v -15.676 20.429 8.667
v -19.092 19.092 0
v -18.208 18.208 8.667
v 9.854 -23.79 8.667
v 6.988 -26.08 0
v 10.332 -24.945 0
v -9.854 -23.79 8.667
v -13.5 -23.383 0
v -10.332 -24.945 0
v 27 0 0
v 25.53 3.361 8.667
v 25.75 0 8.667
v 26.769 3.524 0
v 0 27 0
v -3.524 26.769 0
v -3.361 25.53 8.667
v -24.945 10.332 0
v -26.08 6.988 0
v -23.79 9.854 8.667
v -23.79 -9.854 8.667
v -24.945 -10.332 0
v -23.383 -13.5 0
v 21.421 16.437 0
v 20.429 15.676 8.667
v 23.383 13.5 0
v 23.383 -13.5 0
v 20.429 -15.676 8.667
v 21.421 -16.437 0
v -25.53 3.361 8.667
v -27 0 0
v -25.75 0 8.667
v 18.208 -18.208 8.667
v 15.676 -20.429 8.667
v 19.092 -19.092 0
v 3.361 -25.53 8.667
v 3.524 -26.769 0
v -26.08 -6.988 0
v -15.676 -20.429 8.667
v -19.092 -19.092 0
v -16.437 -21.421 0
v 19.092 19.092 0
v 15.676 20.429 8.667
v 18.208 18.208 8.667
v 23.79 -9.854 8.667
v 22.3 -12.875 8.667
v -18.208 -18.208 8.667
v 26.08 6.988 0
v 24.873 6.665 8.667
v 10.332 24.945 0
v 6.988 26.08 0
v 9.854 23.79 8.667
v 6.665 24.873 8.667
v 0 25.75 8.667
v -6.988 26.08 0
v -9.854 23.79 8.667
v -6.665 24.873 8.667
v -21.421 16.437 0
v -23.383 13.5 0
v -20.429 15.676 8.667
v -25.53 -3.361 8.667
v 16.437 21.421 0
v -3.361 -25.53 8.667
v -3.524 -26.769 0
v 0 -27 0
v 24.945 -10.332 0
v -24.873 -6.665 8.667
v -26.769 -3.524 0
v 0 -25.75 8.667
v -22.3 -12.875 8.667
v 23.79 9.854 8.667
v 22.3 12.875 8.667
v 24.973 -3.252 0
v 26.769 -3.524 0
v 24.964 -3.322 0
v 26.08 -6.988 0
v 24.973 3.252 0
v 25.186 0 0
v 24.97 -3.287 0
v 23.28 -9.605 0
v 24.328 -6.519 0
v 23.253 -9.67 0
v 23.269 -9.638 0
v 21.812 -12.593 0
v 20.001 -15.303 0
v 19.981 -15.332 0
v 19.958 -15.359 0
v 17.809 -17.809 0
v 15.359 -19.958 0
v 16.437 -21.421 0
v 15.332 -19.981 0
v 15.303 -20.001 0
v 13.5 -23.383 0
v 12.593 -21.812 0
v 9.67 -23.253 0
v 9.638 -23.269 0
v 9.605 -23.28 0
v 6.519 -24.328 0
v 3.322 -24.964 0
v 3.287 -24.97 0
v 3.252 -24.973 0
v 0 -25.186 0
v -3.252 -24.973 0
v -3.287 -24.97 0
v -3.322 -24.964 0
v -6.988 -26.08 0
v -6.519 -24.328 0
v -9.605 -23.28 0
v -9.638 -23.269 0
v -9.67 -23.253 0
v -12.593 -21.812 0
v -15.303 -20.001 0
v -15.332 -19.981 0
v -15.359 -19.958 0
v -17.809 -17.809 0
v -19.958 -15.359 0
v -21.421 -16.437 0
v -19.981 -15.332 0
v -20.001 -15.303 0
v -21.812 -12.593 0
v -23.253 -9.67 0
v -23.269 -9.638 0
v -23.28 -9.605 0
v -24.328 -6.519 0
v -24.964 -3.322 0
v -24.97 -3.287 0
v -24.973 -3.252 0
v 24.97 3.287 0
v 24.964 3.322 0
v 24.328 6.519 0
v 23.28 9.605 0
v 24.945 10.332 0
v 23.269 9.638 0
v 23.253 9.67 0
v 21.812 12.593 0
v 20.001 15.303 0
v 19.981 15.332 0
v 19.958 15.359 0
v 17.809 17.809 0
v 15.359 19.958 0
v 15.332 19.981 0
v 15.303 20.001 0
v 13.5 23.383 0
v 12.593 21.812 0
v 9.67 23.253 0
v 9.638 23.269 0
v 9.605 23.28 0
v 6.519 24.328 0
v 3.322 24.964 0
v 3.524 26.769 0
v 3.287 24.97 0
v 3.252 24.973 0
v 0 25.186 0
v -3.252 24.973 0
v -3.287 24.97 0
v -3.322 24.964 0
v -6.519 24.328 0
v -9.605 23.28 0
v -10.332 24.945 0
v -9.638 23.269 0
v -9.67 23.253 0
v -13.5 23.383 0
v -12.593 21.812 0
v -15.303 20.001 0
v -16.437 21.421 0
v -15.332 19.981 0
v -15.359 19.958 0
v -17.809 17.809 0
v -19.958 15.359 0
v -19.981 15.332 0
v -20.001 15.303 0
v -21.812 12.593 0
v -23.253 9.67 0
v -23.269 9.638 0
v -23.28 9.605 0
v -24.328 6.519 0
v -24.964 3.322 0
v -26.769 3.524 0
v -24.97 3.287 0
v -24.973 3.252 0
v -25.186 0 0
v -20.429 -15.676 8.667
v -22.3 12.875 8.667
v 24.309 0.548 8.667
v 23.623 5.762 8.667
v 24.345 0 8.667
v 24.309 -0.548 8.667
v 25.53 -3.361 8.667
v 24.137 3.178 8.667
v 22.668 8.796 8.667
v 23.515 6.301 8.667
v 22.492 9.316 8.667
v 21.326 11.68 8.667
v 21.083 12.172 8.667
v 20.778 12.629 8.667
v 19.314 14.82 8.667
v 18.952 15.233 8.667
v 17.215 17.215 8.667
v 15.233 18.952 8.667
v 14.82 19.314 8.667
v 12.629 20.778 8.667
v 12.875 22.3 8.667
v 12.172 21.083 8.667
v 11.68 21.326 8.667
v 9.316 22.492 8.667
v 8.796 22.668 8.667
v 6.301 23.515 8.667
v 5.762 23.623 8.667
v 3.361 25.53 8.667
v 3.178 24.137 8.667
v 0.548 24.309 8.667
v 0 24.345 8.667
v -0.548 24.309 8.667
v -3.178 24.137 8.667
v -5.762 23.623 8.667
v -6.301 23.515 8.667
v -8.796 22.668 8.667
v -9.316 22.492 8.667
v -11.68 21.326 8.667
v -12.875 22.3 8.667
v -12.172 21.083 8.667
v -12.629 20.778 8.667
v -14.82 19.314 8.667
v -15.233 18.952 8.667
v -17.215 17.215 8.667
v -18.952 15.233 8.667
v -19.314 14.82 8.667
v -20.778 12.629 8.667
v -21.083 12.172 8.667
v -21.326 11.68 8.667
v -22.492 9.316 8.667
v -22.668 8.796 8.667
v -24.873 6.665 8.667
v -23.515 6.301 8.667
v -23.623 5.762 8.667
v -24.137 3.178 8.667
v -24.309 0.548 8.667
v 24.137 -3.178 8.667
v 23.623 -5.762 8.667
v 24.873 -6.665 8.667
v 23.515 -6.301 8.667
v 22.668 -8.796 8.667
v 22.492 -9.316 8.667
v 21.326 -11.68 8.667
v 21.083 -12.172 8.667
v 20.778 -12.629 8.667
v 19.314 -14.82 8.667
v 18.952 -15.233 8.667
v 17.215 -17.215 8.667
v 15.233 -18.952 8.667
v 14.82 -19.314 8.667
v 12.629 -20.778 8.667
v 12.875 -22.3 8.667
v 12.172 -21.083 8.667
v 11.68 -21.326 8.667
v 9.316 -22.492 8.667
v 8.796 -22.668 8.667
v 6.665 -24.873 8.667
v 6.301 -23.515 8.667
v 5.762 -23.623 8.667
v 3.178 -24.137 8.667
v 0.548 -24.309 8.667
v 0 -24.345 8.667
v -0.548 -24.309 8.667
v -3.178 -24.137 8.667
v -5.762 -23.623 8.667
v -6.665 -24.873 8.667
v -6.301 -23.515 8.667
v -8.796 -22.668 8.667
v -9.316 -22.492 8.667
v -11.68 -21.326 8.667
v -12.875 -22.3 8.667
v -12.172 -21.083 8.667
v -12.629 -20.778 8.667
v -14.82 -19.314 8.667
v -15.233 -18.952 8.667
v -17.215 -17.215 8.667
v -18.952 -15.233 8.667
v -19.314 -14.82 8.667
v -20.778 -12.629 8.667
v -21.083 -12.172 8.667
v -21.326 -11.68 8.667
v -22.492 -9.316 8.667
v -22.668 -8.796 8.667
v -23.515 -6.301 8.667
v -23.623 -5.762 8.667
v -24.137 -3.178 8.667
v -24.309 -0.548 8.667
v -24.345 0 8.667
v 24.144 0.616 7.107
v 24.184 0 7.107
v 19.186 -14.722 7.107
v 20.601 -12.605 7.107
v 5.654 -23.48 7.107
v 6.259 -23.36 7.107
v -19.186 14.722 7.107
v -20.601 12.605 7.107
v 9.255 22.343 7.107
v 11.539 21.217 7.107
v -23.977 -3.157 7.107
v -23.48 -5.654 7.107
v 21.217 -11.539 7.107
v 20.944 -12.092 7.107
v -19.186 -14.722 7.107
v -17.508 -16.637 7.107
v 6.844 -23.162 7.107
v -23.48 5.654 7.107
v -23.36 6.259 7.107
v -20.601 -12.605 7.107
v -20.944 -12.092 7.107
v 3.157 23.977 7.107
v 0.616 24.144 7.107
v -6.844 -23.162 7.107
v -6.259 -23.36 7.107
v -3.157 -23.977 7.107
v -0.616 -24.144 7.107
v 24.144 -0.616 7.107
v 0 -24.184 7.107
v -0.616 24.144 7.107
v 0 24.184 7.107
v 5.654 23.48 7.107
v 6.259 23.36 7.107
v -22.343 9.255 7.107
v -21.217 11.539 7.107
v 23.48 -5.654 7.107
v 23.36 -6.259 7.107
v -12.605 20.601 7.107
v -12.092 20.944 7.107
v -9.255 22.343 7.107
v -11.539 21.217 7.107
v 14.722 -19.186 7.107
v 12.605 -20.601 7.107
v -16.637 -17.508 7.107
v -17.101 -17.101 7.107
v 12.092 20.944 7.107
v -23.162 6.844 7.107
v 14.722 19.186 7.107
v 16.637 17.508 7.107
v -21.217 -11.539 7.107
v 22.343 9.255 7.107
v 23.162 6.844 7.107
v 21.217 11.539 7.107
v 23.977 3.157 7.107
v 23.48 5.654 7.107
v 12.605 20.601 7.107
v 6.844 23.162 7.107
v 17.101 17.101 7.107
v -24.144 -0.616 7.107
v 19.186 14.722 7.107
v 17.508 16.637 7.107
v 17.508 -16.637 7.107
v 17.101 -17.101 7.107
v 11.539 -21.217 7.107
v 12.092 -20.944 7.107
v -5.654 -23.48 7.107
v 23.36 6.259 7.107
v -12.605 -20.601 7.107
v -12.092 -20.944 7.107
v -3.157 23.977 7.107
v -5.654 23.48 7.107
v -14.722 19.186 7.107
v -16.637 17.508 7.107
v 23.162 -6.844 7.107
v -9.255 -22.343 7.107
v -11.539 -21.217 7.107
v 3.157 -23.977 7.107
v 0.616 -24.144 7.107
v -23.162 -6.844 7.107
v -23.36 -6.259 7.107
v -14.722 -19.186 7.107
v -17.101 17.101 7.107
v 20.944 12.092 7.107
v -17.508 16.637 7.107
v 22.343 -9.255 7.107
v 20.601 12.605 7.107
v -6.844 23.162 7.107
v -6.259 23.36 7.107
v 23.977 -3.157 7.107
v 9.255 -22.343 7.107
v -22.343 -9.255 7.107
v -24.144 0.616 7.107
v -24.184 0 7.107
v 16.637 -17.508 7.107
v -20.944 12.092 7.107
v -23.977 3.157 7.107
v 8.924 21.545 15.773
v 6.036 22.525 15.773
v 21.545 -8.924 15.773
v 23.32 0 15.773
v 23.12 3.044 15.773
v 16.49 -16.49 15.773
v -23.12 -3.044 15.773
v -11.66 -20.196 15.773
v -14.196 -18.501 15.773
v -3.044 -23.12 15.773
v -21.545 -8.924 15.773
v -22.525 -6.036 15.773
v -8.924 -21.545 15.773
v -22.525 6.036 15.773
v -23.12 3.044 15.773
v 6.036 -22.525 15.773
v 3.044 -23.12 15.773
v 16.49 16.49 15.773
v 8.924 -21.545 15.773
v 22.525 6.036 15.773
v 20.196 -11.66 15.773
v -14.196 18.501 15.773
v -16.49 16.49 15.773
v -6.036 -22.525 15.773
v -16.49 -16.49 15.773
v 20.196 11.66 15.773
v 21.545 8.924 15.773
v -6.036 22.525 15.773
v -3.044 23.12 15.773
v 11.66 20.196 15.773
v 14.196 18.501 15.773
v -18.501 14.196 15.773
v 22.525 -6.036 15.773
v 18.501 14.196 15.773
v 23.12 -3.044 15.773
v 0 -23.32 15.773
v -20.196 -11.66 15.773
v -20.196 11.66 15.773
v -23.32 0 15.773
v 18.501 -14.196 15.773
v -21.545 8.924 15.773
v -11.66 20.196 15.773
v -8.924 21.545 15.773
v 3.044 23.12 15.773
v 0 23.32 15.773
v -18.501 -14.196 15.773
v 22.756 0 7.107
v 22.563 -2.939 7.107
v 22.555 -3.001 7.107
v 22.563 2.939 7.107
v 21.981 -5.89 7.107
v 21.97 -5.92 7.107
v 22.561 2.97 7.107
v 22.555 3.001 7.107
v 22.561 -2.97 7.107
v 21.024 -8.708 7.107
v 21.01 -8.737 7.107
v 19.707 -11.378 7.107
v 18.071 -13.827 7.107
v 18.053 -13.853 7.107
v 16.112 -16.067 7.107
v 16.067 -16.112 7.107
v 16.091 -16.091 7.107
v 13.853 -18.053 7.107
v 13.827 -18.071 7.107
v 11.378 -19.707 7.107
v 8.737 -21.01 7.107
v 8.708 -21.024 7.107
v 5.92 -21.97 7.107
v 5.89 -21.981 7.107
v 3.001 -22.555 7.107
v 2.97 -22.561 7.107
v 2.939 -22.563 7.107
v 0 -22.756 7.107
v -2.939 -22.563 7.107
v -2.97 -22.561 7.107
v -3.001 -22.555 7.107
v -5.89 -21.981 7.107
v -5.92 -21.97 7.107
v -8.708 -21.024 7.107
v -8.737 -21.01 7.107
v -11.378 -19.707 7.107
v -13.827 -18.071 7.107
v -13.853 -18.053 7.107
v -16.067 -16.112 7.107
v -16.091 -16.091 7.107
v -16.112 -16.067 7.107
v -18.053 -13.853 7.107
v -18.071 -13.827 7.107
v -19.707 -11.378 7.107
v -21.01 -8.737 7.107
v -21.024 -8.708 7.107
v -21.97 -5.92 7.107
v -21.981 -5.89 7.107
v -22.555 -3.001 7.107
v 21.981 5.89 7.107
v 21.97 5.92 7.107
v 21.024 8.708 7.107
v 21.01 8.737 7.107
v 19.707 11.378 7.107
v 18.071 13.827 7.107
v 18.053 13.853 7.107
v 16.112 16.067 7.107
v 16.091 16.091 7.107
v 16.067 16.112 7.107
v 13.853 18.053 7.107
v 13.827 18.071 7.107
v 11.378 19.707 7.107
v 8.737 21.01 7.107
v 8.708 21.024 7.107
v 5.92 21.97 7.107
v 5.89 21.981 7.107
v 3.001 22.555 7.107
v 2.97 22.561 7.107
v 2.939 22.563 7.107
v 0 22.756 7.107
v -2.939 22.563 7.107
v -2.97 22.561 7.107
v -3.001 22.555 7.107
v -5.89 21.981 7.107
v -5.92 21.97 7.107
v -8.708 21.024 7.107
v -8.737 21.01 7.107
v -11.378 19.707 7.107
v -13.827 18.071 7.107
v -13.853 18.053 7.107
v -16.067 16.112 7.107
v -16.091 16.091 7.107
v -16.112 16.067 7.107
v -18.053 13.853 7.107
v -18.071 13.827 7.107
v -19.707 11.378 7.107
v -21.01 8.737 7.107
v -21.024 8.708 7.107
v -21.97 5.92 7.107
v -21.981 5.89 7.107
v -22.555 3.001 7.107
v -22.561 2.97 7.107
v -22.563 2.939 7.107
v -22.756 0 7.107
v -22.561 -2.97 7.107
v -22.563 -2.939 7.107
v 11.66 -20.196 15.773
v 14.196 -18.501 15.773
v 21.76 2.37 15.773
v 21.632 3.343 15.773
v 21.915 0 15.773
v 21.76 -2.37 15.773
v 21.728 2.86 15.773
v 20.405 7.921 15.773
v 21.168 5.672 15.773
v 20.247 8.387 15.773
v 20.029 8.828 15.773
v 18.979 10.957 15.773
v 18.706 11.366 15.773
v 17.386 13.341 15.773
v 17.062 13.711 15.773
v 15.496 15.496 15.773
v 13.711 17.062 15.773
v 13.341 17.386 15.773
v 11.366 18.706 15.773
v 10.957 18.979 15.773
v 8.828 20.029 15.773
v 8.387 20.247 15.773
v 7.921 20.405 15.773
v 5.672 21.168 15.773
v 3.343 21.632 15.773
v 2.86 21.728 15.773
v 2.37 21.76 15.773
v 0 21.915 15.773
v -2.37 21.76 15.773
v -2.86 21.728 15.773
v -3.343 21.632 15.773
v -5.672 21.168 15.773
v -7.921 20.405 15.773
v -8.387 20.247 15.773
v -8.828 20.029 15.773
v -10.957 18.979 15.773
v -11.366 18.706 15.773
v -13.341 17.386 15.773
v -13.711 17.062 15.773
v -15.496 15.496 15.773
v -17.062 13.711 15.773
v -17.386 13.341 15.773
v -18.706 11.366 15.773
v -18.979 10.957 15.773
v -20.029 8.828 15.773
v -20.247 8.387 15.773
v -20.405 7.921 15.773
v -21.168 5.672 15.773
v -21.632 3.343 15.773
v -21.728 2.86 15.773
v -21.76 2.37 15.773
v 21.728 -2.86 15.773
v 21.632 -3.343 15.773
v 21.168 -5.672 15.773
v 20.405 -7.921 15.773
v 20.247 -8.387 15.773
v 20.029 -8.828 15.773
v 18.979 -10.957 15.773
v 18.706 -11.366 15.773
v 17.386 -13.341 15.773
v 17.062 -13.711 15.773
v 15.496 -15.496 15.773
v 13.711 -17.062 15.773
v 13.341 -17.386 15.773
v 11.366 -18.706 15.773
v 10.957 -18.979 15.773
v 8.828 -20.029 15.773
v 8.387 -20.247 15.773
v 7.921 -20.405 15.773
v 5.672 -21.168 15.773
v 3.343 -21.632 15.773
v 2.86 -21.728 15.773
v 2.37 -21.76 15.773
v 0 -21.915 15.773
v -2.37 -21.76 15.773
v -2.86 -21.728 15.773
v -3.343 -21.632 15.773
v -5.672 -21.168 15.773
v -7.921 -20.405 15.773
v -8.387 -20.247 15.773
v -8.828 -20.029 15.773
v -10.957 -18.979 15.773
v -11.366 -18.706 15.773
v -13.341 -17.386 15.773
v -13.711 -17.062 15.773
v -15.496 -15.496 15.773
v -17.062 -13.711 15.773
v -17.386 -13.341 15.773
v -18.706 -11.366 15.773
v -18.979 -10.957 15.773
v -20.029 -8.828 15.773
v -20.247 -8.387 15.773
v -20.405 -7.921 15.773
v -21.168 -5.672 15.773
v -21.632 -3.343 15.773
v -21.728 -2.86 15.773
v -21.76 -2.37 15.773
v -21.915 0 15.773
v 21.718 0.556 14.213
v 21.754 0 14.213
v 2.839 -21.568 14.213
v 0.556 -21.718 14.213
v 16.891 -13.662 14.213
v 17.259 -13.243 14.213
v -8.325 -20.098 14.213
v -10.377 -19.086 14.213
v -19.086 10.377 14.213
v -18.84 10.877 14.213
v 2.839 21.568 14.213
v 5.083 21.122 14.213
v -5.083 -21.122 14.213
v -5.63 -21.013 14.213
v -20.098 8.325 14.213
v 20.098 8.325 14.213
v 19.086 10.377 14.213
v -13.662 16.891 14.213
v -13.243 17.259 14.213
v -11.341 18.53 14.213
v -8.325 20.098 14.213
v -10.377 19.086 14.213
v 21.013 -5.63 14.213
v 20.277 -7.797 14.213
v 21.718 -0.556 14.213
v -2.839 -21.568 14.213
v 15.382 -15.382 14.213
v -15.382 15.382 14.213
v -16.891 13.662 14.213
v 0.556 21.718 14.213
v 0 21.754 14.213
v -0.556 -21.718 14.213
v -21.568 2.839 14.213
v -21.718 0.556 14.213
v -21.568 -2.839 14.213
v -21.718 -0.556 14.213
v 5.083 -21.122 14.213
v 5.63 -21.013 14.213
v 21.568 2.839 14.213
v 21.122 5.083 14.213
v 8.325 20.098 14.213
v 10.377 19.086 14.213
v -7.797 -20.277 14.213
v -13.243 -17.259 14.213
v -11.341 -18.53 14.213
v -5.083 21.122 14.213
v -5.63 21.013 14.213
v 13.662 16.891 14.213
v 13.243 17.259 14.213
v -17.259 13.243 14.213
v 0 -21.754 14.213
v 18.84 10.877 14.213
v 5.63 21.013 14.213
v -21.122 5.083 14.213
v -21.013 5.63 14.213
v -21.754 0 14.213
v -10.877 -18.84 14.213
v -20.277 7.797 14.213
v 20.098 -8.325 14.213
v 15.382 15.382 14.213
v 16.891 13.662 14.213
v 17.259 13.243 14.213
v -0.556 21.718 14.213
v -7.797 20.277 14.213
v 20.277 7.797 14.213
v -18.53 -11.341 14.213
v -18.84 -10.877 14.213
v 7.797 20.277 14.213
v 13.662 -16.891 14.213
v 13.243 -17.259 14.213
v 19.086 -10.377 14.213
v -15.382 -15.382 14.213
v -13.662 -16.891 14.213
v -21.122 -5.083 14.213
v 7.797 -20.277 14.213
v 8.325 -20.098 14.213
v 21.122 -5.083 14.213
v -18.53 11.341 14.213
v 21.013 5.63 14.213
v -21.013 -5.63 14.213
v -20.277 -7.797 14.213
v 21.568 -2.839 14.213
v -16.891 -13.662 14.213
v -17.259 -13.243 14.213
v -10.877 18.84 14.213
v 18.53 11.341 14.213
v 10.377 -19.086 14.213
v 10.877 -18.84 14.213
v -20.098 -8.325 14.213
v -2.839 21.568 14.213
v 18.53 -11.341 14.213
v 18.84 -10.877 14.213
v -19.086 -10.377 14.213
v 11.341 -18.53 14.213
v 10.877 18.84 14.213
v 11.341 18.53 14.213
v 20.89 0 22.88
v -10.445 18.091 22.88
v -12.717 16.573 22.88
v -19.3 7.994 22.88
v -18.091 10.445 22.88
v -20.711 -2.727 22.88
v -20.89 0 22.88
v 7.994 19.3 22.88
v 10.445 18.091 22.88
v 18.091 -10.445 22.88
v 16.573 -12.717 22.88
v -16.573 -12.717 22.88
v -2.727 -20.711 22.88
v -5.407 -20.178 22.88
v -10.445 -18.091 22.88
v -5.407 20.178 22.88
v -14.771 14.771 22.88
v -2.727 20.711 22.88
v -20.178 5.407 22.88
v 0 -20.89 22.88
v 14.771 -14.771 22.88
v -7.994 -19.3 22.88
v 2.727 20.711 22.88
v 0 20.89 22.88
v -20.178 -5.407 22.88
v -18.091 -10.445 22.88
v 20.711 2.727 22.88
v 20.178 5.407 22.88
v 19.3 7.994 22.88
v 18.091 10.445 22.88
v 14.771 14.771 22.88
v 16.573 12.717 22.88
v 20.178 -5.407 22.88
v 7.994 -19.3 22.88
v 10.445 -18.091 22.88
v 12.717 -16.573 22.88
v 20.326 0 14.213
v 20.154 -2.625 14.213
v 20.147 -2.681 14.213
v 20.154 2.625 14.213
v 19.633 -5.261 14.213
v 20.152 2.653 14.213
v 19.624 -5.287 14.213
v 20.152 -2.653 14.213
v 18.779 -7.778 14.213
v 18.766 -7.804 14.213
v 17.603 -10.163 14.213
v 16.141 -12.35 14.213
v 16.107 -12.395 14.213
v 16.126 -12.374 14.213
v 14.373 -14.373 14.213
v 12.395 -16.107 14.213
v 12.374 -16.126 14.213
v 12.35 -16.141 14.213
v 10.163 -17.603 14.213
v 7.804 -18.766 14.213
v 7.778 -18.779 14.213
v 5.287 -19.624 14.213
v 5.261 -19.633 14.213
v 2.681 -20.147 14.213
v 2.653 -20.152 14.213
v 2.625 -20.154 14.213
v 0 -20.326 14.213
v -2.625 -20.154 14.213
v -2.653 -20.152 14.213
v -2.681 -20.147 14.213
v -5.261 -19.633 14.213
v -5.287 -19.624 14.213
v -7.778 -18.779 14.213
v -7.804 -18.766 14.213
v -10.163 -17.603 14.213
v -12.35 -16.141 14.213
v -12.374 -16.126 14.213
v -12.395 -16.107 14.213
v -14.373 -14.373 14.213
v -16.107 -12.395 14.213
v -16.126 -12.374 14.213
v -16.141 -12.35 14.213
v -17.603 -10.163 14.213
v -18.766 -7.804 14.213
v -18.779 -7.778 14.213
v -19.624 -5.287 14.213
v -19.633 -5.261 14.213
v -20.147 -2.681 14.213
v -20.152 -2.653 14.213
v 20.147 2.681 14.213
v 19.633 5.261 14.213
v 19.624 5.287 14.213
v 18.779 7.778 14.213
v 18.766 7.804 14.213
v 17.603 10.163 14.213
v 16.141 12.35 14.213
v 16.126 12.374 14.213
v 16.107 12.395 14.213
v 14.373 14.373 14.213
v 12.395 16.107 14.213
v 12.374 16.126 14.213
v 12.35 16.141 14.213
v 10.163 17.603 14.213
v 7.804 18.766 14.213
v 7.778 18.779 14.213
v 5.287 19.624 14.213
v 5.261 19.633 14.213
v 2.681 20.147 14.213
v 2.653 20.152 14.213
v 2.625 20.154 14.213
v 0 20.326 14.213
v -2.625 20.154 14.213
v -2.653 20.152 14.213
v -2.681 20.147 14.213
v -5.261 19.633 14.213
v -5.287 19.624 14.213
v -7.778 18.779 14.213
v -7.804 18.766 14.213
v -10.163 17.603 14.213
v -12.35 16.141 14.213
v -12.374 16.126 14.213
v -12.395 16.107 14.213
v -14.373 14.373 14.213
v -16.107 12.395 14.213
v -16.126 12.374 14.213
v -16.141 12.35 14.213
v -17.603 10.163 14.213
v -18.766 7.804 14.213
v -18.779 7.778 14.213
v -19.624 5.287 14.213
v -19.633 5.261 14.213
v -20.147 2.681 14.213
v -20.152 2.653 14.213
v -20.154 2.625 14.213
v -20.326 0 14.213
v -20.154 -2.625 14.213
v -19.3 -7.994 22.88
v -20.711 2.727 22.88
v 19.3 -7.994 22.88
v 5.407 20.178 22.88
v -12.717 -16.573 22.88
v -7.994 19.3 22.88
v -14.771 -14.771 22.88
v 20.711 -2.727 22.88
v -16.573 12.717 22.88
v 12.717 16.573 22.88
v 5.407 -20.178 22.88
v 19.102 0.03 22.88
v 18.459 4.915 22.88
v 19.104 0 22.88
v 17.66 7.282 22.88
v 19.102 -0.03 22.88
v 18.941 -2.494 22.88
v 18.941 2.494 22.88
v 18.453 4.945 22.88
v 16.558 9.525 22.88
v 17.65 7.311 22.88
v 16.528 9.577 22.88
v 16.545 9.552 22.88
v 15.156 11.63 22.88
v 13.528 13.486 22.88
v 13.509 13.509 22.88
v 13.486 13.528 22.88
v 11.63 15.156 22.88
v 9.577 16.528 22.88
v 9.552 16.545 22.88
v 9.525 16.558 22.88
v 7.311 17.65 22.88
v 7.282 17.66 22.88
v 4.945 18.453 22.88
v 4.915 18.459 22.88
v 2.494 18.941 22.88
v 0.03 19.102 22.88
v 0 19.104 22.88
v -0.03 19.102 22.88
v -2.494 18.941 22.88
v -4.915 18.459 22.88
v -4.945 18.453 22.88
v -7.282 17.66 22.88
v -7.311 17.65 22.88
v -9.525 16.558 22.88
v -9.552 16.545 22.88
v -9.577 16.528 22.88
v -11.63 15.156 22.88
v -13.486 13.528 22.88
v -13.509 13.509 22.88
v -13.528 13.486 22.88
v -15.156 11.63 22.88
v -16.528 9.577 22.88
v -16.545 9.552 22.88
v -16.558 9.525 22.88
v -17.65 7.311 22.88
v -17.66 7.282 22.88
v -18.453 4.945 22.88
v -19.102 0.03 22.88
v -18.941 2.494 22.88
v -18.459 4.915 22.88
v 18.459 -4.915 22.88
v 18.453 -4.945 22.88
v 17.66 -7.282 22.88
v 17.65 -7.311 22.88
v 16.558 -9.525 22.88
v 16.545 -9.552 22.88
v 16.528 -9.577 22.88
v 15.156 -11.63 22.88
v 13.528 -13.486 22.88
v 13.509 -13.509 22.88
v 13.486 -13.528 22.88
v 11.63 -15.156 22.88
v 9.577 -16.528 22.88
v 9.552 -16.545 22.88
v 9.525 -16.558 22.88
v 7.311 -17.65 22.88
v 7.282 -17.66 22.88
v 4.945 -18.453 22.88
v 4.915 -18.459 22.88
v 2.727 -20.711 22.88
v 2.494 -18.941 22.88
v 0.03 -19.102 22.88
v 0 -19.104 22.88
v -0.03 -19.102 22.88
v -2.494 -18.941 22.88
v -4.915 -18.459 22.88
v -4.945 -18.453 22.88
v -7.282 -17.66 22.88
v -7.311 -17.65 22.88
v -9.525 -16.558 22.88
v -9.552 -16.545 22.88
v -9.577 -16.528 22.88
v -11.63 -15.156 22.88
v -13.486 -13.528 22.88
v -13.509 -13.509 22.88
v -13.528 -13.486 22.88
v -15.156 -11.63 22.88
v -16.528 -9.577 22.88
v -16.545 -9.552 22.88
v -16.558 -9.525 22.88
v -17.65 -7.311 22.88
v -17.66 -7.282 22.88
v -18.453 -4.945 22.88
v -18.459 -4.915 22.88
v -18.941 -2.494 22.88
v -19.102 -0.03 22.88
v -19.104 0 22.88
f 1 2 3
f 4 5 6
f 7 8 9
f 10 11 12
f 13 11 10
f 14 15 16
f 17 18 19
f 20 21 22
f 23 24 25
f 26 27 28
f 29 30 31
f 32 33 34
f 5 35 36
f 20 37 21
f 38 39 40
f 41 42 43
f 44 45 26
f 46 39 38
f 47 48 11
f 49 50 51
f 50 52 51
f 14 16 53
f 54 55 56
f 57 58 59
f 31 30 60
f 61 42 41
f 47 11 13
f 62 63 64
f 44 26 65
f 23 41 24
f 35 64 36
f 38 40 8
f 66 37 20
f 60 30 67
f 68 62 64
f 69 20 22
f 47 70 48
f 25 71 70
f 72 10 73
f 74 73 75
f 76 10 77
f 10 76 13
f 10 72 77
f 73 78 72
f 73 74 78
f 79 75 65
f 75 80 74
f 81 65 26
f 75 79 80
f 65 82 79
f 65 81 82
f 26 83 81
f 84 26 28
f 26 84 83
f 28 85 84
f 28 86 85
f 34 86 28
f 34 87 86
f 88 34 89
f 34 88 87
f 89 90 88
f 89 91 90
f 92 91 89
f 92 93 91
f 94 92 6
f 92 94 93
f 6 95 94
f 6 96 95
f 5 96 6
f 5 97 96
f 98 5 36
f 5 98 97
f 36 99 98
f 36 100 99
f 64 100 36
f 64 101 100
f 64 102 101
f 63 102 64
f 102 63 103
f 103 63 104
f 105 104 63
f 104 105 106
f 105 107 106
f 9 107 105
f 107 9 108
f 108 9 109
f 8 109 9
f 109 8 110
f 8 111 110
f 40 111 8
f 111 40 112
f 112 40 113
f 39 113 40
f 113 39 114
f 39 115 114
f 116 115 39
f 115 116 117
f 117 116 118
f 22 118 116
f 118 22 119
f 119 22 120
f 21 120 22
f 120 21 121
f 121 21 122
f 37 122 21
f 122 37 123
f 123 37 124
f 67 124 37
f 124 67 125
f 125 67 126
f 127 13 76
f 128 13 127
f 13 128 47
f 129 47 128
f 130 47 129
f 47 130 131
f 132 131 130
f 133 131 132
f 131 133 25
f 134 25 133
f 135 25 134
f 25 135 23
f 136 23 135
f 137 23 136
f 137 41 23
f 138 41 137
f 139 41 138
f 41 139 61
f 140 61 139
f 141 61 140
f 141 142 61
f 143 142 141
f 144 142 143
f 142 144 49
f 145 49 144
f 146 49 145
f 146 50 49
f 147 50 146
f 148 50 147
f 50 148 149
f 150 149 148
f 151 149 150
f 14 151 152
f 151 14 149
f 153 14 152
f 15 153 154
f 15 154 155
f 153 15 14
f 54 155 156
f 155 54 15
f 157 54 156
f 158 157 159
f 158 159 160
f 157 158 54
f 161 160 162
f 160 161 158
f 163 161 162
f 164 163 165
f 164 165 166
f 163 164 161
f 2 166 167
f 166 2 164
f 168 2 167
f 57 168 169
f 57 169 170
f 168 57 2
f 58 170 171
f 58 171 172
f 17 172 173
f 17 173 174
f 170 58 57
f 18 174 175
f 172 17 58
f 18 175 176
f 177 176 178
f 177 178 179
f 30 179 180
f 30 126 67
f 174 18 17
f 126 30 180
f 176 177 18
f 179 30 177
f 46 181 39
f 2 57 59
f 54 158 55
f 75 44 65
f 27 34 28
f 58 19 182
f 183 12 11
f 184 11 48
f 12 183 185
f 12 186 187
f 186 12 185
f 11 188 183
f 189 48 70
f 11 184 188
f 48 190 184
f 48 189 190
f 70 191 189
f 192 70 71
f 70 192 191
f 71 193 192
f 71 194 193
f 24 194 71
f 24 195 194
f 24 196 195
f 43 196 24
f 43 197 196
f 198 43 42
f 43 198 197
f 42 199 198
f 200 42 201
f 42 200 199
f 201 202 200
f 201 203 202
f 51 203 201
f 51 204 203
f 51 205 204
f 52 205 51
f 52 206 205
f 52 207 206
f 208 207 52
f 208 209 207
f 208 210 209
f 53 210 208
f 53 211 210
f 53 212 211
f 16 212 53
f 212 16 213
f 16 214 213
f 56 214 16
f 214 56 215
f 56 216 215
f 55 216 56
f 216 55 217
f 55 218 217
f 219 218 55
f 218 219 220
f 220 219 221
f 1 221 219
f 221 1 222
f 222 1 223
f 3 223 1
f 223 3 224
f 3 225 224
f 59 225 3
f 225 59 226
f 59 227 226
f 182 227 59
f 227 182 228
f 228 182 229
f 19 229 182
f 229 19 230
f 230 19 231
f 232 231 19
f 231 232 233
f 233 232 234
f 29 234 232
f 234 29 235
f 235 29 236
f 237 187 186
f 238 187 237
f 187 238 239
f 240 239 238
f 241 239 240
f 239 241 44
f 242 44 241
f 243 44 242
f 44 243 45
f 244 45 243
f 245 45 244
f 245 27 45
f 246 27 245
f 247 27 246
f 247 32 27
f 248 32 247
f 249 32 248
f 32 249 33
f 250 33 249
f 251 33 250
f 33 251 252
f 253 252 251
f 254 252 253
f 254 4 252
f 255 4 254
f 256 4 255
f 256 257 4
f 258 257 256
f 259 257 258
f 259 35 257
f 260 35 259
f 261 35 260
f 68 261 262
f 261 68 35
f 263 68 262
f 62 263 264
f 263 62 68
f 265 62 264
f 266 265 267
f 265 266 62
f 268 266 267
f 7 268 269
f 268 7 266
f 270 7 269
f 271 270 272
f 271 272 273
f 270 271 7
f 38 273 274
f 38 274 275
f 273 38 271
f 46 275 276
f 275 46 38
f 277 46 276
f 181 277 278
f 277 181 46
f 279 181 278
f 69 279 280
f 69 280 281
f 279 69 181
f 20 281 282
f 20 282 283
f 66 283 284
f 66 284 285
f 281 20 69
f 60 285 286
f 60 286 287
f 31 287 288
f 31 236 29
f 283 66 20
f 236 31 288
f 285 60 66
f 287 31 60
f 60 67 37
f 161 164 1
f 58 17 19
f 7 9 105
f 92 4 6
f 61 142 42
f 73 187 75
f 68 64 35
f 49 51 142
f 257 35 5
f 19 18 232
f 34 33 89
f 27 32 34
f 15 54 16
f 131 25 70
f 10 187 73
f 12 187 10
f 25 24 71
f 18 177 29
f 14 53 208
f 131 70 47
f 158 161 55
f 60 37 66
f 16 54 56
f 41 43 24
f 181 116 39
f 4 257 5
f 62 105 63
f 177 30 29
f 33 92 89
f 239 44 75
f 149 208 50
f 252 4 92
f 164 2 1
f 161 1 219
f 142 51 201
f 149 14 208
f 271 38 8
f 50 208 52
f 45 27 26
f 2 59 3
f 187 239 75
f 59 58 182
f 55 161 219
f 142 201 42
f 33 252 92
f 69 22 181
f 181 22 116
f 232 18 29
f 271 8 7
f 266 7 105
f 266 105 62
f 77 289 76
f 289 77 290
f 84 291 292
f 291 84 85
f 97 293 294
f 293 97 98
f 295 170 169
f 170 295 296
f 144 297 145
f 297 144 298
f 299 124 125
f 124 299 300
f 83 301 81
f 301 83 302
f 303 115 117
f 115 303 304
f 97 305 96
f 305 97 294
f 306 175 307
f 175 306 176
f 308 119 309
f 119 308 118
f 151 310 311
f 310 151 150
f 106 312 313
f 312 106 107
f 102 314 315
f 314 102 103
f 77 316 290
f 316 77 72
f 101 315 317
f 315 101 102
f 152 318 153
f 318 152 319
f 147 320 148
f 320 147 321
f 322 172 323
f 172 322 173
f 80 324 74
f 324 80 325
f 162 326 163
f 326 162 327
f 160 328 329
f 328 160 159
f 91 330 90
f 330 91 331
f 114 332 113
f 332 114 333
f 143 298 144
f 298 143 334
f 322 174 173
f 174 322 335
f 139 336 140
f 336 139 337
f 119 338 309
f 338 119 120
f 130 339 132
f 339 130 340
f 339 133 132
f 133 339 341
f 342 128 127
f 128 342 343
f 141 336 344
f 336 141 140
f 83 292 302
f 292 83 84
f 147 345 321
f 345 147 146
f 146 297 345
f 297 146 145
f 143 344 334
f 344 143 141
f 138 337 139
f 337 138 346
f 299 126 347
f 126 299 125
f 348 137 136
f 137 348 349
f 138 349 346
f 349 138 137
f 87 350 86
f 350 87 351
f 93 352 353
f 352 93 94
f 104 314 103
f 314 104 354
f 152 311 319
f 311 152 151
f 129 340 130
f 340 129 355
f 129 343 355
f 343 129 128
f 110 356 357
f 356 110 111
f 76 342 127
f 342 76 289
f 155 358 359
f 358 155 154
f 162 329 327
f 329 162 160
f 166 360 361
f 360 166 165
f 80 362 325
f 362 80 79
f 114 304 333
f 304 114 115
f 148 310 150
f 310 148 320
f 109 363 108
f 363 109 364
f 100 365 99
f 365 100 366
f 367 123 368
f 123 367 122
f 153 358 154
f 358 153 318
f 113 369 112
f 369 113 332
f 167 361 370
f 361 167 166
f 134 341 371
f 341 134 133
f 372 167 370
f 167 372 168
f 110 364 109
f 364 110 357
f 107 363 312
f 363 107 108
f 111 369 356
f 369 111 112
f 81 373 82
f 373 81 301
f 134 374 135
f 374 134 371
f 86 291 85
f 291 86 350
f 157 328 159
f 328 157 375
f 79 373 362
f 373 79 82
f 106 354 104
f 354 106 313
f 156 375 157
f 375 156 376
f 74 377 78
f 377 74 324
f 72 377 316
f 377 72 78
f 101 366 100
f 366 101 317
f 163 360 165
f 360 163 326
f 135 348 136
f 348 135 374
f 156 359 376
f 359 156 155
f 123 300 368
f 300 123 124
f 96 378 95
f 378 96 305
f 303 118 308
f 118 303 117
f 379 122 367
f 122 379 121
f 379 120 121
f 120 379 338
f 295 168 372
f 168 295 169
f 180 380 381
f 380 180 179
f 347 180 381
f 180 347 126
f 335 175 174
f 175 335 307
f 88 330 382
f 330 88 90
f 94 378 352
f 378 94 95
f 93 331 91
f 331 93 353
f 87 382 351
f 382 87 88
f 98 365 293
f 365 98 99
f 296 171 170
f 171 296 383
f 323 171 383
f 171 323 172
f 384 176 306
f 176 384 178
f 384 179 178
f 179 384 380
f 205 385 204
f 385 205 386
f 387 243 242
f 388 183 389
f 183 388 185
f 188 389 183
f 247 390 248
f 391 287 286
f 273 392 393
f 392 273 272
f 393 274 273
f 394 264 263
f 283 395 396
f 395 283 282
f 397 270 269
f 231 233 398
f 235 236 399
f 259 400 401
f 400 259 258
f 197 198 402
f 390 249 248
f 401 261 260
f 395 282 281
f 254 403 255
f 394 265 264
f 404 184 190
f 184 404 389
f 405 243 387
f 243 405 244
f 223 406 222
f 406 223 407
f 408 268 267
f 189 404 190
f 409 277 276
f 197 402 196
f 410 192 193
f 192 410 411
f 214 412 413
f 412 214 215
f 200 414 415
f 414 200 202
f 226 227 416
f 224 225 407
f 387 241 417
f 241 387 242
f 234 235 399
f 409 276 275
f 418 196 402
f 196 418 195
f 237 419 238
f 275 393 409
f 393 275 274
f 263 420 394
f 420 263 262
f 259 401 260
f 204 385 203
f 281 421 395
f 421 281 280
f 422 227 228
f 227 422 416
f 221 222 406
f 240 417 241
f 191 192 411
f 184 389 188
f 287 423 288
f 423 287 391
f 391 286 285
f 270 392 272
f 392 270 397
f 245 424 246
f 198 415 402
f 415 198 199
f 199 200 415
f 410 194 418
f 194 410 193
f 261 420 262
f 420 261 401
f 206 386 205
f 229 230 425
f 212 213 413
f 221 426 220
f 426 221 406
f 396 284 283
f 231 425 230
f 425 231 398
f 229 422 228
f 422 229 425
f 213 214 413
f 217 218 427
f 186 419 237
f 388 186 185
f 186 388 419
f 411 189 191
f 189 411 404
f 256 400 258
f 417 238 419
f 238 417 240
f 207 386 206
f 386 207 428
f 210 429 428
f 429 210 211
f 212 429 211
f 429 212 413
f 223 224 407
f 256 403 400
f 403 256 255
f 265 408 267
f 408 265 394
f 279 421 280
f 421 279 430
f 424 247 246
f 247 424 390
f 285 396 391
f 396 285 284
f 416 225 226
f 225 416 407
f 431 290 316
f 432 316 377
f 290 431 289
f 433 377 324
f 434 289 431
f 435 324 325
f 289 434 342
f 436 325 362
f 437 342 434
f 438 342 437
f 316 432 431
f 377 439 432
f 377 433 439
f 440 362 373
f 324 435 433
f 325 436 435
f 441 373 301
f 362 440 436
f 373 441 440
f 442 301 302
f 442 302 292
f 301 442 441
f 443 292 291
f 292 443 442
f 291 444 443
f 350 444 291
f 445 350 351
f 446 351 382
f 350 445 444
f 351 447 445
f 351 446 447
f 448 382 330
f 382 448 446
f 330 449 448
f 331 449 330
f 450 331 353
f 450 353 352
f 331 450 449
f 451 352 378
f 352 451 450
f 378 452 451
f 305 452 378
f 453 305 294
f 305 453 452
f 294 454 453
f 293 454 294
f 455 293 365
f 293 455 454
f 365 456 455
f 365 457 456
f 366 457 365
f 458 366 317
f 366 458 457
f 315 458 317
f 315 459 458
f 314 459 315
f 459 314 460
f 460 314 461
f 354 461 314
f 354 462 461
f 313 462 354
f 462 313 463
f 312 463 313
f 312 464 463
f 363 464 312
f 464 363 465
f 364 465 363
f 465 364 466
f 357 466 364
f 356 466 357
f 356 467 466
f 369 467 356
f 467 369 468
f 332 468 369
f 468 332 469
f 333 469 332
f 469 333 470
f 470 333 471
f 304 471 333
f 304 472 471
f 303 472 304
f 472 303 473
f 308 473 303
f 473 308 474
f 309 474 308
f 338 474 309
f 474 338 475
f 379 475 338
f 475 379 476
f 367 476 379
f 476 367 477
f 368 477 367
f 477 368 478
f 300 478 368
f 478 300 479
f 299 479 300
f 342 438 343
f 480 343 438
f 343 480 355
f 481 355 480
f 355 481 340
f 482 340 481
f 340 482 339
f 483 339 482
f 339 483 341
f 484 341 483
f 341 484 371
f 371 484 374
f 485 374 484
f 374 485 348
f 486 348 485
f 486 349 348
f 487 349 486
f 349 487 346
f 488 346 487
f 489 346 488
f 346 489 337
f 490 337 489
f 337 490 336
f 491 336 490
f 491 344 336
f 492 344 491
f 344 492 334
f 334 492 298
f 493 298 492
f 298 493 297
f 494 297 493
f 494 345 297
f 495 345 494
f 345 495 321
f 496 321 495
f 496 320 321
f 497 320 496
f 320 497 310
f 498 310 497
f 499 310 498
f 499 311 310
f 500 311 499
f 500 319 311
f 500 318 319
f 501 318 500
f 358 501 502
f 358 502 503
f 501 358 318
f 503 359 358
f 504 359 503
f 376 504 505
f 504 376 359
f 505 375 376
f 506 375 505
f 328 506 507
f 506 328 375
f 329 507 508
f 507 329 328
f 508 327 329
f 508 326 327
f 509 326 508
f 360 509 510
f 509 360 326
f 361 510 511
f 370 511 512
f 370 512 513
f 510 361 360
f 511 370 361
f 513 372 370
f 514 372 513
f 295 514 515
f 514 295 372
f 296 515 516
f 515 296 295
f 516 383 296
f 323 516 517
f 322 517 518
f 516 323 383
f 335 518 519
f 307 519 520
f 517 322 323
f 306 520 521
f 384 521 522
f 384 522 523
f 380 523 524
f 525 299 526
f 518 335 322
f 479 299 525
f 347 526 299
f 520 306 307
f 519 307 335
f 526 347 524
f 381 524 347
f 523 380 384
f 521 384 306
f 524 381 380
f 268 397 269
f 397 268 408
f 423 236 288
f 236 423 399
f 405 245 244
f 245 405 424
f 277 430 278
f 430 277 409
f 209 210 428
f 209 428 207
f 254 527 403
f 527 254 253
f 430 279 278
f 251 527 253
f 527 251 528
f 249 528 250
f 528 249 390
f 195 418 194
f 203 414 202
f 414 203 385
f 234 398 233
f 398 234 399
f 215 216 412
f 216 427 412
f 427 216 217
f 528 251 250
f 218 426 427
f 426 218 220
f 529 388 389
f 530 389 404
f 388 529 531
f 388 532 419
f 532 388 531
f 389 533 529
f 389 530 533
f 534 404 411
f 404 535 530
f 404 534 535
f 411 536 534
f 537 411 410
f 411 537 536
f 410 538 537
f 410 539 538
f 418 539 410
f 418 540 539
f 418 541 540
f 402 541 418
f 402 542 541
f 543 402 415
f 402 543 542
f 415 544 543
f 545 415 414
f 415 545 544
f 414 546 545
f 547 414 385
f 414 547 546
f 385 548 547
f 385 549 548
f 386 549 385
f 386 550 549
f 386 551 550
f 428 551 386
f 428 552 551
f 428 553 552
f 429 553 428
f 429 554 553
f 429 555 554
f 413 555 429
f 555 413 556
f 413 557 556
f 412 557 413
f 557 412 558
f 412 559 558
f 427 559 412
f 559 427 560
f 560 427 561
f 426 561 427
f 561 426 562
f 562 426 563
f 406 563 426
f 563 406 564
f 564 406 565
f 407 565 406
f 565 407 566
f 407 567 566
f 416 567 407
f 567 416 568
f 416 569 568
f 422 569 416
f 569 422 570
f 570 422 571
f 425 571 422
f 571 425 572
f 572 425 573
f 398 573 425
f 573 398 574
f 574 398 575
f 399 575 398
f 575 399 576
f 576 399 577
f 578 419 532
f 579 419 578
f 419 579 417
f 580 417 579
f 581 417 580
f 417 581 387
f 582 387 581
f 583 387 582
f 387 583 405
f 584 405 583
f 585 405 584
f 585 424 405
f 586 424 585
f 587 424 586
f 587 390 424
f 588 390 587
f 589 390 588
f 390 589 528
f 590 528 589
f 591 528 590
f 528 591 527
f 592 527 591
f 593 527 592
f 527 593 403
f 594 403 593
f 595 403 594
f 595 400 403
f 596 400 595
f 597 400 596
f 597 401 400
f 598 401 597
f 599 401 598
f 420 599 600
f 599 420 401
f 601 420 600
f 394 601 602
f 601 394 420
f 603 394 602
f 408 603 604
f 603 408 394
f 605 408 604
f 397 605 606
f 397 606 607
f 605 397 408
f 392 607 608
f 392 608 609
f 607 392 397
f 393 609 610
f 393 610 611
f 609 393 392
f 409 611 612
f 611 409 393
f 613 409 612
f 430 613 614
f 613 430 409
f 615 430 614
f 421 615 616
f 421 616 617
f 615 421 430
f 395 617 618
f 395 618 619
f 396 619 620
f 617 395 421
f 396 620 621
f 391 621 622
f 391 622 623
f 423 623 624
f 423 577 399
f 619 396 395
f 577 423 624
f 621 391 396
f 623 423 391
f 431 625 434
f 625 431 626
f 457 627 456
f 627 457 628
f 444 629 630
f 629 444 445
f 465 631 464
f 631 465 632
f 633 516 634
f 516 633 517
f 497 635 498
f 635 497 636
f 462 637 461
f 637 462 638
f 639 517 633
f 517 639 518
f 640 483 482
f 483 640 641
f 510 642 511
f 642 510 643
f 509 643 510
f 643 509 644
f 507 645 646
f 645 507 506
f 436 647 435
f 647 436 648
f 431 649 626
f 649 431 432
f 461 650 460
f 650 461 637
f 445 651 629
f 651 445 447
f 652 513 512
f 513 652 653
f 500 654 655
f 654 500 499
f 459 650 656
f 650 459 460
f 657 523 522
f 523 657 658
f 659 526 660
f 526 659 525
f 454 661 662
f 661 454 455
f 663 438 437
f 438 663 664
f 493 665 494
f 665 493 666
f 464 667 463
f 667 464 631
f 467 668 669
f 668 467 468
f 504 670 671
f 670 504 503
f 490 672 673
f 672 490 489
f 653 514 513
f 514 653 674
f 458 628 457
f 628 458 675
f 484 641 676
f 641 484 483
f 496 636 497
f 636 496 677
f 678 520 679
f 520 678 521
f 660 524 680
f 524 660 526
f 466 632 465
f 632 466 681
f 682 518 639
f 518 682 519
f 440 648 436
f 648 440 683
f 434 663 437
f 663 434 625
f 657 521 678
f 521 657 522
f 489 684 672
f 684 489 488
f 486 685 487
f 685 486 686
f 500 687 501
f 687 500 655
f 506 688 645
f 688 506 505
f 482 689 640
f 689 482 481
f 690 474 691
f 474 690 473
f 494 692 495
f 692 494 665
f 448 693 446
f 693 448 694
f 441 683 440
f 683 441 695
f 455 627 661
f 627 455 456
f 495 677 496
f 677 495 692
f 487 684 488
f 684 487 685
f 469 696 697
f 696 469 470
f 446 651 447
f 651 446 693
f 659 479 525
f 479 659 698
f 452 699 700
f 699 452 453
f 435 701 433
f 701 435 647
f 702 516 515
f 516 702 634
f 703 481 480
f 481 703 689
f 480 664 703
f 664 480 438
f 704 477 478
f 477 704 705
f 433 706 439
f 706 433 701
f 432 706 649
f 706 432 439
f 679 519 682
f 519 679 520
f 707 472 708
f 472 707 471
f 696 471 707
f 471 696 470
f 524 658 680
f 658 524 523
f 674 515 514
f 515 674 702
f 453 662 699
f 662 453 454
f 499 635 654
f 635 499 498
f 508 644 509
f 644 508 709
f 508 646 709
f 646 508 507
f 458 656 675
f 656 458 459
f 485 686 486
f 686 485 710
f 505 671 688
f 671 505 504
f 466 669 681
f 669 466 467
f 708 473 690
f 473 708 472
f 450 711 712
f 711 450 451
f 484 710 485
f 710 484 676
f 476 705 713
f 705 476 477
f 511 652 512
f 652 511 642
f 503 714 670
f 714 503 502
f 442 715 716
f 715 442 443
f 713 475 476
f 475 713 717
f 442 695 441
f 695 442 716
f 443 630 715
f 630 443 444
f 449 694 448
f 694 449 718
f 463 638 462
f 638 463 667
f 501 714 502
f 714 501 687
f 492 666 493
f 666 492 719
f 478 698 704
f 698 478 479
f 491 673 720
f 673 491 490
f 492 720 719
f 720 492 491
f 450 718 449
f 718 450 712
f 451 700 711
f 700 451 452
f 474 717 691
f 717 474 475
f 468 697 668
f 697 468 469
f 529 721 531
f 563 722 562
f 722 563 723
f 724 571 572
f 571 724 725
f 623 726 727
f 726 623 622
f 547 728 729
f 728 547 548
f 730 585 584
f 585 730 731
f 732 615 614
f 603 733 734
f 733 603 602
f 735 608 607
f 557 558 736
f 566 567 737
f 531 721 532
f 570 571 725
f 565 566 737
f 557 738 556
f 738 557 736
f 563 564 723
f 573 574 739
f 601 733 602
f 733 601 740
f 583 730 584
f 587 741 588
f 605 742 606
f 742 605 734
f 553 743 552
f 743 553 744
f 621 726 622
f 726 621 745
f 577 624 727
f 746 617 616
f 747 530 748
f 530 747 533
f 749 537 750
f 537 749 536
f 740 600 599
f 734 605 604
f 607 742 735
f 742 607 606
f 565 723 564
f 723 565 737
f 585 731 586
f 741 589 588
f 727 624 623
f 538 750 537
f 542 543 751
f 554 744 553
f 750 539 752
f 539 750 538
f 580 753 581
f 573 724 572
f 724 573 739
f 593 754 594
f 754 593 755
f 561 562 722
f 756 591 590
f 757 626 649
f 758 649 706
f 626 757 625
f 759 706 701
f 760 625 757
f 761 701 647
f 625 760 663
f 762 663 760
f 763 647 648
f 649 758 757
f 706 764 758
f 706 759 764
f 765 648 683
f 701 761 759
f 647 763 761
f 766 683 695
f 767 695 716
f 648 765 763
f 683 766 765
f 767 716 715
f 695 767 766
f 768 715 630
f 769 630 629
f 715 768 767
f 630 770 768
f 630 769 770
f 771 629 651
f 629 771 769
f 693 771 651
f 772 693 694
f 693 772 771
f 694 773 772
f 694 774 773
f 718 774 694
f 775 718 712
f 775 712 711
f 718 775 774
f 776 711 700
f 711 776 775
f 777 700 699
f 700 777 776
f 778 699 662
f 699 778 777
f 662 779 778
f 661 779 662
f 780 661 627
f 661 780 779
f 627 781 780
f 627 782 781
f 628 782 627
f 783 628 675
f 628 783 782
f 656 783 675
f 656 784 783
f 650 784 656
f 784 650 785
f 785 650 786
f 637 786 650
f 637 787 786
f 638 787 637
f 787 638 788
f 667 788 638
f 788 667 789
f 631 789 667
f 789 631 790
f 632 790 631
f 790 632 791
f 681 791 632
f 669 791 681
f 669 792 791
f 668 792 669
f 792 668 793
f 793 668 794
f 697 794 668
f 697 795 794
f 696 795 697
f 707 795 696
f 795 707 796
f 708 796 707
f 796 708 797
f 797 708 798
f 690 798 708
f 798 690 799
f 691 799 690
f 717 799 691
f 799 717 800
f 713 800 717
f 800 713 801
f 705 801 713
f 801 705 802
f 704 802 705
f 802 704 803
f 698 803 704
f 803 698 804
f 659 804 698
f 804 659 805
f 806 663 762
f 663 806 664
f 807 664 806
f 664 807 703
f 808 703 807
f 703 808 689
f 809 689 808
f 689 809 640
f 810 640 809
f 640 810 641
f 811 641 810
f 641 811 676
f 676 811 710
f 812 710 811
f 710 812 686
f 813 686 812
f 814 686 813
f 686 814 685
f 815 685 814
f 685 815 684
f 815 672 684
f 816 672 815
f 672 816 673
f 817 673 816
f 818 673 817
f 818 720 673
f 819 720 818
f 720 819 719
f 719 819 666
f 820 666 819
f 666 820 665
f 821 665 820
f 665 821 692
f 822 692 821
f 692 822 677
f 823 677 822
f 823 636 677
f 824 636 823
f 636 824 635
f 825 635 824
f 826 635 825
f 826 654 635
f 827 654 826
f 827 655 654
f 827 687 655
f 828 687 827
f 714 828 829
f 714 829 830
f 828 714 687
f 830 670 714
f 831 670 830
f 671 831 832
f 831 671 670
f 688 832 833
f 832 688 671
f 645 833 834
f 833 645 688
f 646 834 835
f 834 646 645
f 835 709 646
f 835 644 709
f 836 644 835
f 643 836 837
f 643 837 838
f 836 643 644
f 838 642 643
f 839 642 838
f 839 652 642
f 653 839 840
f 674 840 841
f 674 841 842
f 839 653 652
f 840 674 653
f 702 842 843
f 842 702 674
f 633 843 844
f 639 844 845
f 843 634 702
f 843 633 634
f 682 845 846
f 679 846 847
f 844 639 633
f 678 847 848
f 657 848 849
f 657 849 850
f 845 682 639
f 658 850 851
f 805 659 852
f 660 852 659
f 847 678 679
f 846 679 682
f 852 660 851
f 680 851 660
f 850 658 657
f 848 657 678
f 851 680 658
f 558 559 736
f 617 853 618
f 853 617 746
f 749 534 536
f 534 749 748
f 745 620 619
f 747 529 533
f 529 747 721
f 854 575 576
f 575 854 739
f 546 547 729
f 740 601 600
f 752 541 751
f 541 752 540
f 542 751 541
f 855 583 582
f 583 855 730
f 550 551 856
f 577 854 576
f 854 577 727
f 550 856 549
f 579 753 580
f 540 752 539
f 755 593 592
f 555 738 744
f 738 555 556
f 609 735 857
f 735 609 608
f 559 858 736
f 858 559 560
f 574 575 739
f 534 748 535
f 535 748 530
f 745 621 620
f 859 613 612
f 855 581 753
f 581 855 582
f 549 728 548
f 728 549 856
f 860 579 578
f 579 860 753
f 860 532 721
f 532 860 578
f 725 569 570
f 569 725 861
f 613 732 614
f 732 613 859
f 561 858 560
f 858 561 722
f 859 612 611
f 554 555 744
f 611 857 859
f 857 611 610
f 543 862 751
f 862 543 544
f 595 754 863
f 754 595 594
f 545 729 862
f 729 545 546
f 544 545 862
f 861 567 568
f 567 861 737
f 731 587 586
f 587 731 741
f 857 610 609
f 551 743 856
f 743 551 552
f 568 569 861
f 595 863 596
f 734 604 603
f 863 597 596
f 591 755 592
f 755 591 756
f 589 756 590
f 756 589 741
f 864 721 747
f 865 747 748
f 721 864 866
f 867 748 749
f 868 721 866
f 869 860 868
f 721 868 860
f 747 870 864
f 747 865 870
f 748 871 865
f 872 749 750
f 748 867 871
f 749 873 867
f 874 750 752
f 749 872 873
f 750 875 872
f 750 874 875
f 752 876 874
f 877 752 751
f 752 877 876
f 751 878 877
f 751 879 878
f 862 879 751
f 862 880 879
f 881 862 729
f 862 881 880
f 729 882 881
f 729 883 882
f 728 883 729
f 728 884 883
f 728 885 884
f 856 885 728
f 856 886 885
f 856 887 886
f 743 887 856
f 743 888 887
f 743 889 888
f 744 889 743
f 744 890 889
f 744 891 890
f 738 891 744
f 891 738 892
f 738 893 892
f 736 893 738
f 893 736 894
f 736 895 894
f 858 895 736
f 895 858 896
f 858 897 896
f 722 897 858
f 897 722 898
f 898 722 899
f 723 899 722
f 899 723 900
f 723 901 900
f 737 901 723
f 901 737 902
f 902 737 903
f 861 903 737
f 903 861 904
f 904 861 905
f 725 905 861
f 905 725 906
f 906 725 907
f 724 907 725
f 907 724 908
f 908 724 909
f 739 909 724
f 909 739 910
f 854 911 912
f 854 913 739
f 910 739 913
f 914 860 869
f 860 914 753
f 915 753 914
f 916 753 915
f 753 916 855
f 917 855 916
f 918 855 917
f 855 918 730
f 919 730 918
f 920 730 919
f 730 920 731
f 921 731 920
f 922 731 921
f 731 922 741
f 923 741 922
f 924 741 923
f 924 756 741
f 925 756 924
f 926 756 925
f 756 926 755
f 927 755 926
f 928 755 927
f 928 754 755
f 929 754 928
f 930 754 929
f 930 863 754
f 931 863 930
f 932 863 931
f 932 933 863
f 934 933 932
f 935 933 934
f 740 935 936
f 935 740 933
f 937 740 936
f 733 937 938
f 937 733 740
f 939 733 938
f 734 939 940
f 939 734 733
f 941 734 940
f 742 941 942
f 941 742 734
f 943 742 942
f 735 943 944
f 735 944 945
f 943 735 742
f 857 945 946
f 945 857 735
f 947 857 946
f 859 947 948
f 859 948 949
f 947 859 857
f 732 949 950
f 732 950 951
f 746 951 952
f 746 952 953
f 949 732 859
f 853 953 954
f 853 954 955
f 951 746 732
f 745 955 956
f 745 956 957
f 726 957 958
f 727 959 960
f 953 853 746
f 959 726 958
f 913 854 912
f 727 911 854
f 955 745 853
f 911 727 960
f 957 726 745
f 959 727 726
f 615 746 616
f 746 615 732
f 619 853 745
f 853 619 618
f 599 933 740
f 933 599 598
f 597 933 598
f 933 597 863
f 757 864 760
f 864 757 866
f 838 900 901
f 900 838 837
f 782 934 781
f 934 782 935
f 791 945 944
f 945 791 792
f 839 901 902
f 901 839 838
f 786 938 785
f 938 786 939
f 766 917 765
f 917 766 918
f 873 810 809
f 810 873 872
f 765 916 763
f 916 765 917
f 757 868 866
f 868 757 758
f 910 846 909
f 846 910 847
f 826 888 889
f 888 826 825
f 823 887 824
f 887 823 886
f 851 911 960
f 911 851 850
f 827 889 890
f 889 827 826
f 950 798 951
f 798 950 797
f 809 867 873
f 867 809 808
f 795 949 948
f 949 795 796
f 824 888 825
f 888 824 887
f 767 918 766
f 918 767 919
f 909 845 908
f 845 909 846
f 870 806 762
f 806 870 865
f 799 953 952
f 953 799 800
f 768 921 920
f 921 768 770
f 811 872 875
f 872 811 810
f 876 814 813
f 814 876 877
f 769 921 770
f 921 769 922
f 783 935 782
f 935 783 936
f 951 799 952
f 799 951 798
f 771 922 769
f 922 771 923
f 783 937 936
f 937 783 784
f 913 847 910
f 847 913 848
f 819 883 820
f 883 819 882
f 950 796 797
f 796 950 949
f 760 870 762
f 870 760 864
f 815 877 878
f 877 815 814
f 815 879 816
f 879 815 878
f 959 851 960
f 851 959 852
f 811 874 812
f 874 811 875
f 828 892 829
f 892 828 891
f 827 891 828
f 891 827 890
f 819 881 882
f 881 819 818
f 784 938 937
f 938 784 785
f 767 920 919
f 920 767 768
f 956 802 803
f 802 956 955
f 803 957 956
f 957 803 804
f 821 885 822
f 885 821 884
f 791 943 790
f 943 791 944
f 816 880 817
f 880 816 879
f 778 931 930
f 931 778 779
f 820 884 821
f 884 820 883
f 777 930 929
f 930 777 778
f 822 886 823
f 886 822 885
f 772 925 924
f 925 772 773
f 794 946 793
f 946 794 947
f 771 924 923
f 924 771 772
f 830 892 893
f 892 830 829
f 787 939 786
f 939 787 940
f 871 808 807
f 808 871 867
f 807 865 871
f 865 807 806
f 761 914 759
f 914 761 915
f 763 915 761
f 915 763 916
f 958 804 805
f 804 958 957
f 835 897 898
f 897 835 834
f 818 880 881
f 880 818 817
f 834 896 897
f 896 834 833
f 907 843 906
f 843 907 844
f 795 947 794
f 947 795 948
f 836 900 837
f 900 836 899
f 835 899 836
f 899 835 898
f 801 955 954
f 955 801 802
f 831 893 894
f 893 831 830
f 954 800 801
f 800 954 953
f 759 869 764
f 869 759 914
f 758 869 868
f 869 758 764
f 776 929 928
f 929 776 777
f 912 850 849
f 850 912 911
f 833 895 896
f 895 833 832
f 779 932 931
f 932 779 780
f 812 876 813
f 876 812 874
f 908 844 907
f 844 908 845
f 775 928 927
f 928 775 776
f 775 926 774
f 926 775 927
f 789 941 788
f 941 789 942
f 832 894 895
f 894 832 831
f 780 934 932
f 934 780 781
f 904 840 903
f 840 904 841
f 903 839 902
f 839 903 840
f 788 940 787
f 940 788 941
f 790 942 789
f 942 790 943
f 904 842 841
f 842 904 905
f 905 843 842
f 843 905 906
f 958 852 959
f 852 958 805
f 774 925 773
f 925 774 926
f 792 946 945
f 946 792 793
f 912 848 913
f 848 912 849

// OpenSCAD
// file: params.scad
// ==================== source of truth ====================
// Every number below is cross-referenced to either this repo's own simulation
// model (src/robot_cat_description/urdf/cat.urdf.xacro at scale 1.0, and
// robot_cat_gait/leg_ik.py) or to a measurement of a real CAD file - see
// hardware/cad/measure/README.md for the method, the sources and the raw
// numbers.
//
// Nothing here is a guess any more. The two values that used to be flagged
// ADJUSTABLE (the horn bolt circle and a downloaded bracket's flange) were
// replaced by measurements taken off the official STS3215 STEP model, so the
// downloaded bracket is no longer on the critical path at all.

// ---- leg geometry - VERIFIED, must match leg_ik.py exactly ----
thigh_length = 110;   // LegGeometry.thigh_length, axis to axis
calf_length  = 110;   // LegGeometry.calf_length, axis to paw centre
hip_offset   = 25;    // hip roll axis -> thigh pitch axis, lateral
foot_radius  = 12;    // paw pad sphere radius

// ---- trunk geometry - VERIFIED ----
hip_x = 110;          // hip mount, x from body centre (so 220mm hip-to-hip)
hip_y = 55;           // hip mount, y from body centre (so 110mm hip-to-hip)
body_length = 300;
body_width  = 111;
body_height = 141;

// ---- ST3215 / STS3215 servo - MEASURED from the official CAD model
// (TheRobotStudio/SO-ARM100, STEP/SO100/STS3215_03a.step). The shop pages'
// "45.2 x 24.7 x 35" is the CASE only; the model bounding box is 39.6 deep
// because the output boss and the idler boss stand proud of it. Pocket depth
// must use servo_h, clearance above it must allow for servo_boss. ----
servo_l = 45.4;
servo_w = 24.8;
servo_h = 35.4;        // case alone, faces at +/-17.7 from centre
servo_boss_h = 2.3;    // output boss above the case face
servo_boss_d = 22.1;   // raised collar around the output axis, +0.1 clearance
servo_axis_x = 12.5;   // output axis offset from the servo's own centre,
                       // i.e. 10.2mm in from the near end face
servo_fit = 0.4;       // FDM clearance added per side around the pocket

// ---- Raspberry Pi 5 mounting - VERIFIED against the official Raspberry Pi
// Ltd mechanical drawing (RP-008347-DS-1): 58 x 49mm hole spacing, Ø2.7mm
// holes (clearance for M2.5) ----
pi_hole_x = 58;
pi_hole_y = 49;
pi_hole_d = 2.9;       // add a touch over the datasheet 2.7 for FDM tolerance

// ---- servo horn bolt circle - MEASURED, exact
// Four holes, all on ONE circle of radius 7.000mm (diameter 14.00), at 45,
// 135, 225 and 315 degrees - a square of side 9.90mm. Least-squares circle
// fit to the STEP model's analytic CIRCLE entities, residual 0.000mm.
//
// The earlier "three holes at 6.7, one at 5.6" here was wrong. It came from
// misreading OpenRoboticDog's hip_x4.stl, which has no horn circle at all -
// those were the servo's case screws. See measure/README.md.
horn_bolt_r = 7.0;
horn_bolt_d = 2.7;         // M2.5 clearance, model bore is 2.5
horn_hub_d = 9.2;          // Ø9.0 hub on the horn face, +0.2 clearance

// ---- servo case screw positions - MEASURED
// The four screws that hold the servo case together double as mounting
// points: this is how OpenRoboticDog fixes the servo to its frame, and that
// part measures 3.75mm apart against this model's 3.8mm. Positions are given
// relative to the servo centre, on both flanks at y = +/-10.25.
case_screw_y = 10.25;
case_screw_x = [4.2, -16.5, -20.3];
case_screw_d = 2.2;        // M2 clearance; the servo's own bore is 1.5 pilot

// Two of the three are enough to fix a servo, and OpenRoboticDog uses two.
// Which two matters here: taking the pair NEAREST the output axis keeps a
// mounting pad 35mm long instead of 45mm, which is what lets the trunk frame
// stay inside the 300mm body. The outermost screw stays available if a part
// wants all three.
case_screw_x_used = [4.2, -16.5];

// ---- leg segment spines ----
// The rectangular bar between a segment's two end plates. Declared here
// because FOUR files need it and only agreement makes them fit: the segment
// itself, and the cosmetic fairing that snaps over it. A comment saying
// "must match" is not a mechanism.
thigh_spine = [14, 10];
calf_spine  = [12, 9];

// ---- print structure ----
wall = 4;             // load-bearing wall thickness in PETG
insert_d = 4.2;        // M3 brass heat-set insert bore
insert_depth = 6;
$fn = 48;
// main file
// Kolnierz szyi. Bridges the gap between the body skin and the head, over
// the two neck microservos, and hides them without restricting the pan and
// tilt range the urdf allows (+/-0.6 rad pan, -0.3..+0.5 tilt).
//
// Stacked rings rather than a smooth tube: a smooth tube has to be either
// loose enough to look wrong or tight enough to bind, whereas rings can
// overlap and slide past each other as the head turns.
//
// Sized to stand proud of BOTH the body opening and the skull. An earlier
// version at 34mm disappeared under the head, which on the concept render is
// one of the clearest features of the whole robot.
include <shell_lib.scad>

neck_collar_form();
